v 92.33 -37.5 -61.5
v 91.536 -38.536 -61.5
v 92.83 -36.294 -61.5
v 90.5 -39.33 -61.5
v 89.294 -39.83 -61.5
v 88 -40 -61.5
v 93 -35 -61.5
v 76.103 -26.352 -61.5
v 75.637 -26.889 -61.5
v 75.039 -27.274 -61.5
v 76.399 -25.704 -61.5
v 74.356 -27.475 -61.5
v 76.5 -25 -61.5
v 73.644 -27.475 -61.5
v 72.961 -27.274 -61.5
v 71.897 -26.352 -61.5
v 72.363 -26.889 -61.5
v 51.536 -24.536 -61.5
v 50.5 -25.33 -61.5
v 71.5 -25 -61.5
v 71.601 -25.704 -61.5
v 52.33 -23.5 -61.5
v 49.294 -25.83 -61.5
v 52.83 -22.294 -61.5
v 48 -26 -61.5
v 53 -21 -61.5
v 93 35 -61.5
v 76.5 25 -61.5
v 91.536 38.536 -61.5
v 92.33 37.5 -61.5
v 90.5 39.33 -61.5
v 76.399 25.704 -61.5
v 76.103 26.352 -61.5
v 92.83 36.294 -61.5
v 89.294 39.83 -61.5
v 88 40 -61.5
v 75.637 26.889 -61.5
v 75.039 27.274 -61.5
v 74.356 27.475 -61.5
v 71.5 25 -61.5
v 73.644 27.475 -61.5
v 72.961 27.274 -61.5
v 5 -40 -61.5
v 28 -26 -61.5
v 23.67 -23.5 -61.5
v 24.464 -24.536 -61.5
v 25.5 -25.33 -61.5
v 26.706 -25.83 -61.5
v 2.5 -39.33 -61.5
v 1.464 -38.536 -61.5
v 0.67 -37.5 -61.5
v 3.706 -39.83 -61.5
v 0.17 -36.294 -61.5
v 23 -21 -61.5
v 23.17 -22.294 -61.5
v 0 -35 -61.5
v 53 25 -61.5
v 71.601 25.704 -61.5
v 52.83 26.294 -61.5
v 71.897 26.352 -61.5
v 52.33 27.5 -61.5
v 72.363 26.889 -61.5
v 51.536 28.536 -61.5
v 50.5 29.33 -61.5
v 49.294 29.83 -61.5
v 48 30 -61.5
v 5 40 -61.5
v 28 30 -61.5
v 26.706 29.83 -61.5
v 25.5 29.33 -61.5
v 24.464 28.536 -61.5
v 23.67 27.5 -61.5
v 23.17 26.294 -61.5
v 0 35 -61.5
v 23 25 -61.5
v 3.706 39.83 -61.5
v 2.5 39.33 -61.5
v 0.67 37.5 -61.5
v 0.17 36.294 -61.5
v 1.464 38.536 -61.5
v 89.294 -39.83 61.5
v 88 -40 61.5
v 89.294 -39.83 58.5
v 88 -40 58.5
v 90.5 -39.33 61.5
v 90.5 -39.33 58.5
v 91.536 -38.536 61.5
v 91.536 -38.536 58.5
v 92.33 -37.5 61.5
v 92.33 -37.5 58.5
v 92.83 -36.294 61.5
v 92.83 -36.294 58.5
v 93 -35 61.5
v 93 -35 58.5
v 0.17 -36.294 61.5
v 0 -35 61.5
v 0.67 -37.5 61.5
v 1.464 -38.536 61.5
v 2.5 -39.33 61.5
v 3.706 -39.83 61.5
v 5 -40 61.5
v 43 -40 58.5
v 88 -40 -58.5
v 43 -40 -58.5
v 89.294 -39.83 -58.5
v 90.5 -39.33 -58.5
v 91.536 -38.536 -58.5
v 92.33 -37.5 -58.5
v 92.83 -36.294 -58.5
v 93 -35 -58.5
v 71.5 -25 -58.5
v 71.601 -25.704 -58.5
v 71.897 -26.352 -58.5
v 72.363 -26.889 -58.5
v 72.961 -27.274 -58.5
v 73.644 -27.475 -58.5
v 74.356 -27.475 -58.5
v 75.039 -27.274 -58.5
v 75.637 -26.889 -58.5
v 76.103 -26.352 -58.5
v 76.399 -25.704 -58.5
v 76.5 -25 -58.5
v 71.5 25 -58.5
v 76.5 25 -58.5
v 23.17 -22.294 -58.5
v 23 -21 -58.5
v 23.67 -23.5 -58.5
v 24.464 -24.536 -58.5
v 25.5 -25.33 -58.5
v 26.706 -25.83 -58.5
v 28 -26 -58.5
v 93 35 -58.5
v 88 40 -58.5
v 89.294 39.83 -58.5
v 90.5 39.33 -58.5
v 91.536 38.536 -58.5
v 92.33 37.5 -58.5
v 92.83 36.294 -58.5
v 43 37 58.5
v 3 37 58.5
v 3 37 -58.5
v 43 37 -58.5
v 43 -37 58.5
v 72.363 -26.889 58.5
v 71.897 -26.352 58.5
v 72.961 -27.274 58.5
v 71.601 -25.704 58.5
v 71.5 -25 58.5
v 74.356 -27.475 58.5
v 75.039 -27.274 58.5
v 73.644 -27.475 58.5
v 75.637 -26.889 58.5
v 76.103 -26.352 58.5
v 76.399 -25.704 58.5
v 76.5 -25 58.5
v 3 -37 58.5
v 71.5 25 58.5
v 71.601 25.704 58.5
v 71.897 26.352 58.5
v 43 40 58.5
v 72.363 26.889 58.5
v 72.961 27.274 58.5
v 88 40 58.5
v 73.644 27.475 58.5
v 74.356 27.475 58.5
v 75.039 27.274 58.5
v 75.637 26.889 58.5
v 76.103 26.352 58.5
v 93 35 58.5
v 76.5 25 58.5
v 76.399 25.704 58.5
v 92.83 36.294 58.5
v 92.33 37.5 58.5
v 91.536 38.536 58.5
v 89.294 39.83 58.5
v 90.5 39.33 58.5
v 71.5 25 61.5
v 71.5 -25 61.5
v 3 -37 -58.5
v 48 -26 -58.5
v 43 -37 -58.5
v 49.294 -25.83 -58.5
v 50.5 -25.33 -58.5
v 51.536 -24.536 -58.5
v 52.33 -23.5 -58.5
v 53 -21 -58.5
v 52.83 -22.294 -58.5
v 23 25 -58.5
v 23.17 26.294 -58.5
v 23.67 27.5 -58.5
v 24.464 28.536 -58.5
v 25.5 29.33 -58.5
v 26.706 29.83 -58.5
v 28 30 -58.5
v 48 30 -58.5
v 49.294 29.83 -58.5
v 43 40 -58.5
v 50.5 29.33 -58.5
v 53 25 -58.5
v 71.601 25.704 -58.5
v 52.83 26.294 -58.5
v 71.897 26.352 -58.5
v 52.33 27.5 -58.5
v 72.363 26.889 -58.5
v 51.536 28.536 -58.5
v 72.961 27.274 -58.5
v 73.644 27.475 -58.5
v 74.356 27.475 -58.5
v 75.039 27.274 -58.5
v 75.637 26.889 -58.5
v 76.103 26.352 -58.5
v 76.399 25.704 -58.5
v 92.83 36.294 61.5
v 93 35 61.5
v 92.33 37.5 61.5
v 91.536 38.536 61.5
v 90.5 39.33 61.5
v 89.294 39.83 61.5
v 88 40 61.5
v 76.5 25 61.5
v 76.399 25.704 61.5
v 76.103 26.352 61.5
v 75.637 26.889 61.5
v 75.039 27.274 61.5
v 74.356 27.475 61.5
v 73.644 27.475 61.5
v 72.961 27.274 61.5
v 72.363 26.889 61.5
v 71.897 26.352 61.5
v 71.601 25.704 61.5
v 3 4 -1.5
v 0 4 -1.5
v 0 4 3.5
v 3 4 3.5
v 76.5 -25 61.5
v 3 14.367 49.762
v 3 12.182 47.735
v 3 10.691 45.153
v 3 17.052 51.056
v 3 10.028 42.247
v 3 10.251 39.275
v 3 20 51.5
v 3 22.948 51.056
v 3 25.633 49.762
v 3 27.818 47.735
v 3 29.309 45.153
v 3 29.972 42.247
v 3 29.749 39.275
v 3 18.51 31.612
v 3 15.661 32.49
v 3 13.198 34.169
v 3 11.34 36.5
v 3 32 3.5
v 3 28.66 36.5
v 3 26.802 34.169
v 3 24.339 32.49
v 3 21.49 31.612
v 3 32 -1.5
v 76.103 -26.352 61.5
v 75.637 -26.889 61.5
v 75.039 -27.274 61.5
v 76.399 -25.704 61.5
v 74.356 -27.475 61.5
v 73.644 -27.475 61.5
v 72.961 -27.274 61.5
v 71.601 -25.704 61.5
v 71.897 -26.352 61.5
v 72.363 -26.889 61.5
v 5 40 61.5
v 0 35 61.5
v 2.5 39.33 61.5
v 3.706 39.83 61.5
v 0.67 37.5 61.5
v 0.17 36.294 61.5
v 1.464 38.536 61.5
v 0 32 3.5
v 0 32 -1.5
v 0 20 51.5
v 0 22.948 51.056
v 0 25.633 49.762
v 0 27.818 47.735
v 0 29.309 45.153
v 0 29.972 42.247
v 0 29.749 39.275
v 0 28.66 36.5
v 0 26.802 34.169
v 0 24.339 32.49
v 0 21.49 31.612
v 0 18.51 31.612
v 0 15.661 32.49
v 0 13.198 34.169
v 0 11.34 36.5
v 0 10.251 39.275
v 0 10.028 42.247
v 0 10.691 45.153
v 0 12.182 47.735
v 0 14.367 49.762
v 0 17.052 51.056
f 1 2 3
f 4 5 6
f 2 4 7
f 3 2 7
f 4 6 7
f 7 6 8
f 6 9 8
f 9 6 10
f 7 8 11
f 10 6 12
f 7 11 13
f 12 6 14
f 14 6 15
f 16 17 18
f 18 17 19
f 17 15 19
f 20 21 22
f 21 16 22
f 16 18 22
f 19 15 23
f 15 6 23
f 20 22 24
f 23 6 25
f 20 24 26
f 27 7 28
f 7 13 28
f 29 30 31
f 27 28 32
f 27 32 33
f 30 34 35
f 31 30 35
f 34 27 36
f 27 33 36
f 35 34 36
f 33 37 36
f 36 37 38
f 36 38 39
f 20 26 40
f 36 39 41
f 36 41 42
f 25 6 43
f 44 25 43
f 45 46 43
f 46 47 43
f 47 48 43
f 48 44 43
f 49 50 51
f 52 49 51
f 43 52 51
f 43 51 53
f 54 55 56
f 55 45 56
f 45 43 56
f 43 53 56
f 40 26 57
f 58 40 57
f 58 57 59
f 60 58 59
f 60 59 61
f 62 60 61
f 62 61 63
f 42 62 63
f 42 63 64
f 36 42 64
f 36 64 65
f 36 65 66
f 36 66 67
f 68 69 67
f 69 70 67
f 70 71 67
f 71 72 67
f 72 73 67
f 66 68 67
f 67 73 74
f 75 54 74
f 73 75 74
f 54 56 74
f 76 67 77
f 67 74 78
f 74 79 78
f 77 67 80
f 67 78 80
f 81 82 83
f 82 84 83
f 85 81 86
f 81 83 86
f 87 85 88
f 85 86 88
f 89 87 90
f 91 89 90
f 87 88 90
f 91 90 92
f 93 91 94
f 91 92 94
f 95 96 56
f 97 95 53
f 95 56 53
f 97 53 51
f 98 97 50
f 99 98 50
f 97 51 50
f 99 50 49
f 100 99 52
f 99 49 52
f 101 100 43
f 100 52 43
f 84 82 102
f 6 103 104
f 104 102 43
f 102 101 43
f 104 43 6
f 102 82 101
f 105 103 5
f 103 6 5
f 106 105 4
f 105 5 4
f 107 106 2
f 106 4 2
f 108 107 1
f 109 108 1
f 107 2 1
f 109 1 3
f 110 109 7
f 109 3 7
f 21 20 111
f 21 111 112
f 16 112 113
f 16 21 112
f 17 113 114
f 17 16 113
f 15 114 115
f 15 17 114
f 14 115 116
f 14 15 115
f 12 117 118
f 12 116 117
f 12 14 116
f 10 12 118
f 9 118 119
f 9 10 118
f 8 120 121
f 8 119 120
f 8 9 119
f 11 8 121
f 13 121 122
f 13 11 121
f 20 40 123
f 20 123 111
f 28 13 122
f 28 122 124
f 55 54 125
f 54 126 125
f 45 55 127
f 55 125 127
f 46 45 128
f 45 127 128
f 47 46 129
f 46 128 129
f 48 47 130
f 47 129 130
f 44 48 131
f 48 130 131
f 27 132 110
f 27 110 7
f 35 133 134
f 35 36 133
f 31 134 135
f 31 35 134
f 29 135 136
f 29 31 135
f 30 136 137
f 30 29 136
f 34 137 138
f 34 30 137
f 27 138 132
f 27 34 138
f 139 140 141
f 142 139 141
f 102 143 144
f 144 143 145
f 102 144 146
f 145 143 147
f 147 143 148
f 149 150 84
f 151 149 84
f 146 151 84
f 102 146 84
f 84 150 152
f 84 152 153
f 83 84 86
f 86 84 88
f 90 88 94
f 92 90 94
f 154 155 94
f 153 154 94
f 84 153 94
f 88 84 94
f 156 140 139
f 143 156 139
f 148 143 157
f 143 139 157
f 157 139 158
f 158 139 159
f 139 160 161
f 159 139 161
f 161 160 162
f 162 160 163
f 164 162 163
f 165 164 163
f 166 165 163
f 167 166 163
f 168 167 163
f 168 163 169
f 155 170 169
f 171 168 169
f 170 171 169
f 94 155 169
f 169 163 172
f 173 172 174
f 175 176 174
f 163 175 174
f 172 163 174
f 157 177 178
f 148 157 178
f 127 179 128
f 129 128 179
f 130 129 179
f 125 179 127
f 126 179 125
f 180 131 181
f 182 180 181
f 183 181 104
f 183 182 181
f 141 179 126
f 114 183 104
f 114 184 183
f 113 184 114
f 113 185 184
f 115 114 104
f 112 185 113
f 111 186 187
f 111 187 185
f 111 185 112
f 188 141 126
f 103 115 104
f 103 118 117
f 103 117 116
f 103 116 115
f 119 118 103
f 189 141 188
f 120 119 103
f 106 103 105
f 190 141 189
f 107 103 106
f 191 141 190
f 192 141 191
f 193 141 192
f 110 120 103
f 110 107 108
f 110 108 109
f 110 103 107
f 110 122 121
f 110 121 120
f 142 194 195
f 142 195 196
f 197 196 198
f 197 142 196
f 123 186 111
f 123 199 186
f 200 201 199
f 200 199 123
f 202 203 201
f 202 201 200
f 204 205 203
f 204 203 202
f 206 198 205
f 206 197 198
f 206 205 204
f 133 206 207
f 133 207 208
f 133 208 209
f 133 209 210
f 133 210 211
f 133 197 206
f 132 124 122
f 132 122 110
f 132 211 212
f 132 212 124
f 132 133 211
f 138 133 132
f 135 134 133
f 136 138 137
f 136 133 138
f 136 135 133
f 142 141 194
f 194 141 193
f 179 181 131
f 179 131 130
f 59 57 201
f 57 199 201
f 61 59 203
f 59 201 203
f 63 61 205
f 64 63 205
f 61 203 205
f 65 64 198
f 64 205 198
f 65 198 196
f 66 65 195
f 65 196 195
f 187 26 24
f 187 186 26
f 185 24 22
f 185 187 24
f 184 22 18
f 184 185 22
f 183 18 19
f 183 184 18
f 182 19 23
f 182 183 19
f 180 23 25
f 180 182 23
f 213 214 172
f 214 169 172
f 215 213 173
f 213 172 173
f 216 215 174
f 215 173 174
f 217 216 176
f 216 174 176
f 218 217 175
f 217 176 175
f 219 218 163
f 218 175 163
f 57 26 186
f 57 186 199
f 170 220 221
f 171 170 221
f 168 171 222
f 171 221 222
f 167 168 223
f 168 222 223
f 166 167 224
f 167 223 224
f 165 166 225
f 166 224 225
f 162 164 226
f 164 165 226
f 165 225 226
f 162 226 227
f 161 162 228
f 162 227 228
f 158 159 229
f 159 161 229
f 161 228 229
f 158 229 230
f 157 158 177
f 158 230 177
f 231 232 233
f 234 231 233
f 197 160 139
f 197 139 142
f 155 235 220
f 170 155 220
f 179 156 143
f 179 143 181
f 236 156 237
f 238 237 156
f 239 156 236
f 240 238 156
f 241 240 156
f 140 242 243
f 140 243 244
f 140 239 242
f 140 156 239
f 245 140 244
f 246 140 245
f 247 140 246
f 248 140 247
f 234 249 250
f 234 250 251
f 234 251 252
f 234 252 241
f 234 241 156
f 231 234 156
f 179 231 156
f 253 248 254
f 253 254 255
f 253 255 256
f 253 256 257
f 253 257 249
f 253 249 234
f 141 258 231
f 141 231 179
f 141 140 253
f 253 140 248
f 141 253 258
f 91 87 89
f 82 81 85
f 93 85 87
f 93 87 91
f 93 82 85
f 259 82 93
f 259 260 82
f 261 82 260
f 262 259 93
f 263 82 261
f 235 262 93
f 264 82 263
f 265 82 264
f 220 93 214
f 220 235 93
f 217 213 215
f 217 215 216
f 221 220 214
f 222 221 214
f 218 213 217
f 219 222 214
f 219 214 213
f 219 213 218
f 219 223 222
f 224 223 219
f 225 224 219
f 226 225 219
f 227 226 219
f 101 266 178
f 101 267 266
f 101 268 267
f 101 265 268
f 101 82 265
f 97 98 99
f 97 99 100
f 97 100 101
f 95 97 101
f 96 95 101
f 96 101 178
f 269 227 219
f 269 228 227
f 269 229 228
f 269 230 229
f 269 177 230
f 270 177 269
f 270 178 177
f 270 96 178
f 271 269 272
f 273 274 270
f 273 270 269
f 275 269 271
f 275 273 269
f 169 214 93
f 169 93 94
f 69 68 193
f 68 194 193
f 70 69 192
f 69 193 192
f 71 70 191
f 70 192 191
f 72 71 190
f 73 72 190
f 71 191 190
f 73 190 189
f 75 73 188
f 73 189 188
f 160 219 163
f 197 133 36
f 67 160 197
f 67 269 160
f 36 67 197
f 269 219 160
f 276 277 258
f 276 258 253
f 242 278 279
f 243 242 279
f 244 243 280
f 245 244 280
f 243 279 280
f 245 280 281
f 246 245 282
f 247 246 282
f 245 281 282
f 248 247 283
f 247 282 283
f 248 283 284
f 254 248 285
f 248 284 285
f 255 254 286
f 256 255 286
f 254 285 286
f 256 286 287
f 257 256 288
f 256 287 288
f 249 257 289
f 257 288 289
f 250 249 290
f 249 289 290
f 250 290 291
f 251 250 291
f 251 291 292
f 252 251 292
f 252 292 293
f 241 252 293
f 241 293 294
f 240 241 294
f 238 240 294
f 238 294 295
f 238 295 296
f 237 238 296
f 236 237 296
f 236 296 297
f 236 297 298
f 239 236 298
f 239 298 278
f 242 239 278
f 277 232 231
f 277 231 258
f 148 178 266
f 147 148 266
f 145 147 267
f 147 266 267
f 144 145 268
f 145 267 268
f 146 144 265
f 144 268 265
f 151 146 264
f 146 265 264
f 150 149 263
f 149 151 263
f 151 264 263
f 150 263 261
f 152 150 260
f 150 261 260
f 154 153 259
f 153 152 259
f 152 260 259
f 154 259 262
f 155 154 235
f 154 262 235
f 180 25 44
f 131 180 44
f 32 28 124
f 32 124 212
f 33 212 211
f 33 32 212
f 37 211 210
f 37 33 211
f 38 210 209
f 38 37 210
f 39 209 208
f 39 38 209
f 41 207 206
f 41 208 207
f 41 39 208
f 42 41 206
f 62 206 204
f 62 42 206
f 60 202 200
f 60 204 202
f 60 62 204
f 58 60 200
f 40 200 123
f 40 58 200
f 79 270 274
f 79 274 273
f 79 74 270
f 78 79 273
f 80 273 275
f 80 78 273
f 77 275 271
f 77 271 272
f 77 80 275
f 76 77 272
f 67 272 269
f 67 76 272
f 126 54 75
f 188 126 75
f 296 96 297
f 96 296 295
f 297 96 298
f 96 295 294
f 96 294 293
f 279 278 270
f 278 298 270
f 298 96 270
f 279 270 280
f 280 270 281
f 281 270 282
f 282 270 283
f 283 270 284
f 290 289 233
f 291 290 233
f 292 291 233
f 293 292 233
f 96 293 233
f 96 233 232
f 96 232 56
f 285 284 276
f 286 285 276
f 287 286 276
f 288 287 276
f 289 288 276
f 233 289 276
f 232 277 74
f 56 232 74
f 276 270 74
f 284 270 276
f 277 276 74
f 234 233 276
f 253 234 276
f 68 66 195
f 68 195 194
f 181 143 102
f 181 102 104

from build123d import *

# Parameters (mm, degrees)
SKETCH_1_W          = 123
SKETCH_1_H          = 80
EXTRUDE_1_DEPTH     = 93
SHELL_1_T           = -3
SKETCH_2_W          = 50
SKETCH_2_H          = 117
CUT_EXTRUDE_1_DEPTH = 138.227001716
FILLET_1_R          = 5
FILLET_2_R          = 5
CUT_EXTRUDE_2_REACH = 161.305
CUT_EXTRUDE_4_REACH = 161.305
SKETCH_5_W          = 30
SKETCH_5_H          = 56
CUT_EXTRUDE_5_REACH = 120.454
SKETCH_6_R          = 10
FILLET_3_R          = 5
CUT_EXTRUDE_6_REACH = 120.454
SKETCH_7_W          = 5
SKETCH_7_H          = 28


with BuildPart() as part:
    # 草圖1 → 填料-伸長1 (new body)
    with BuildSketch(Plane(origin=(0, 0, 0), x_dir=(0, 0, -1), z_dir=(1, 0, 0))):
        Rectangle(SKETCH_1_W, SKETCH_1_H)
    extrude(amount=EXTRUDE_1_DEPTH)

    # 薄殼1
    shell_1_openings = [part.faces().sort_by_distance(p)[0] for p in [
        (93, 0, 0),
    ]]
    offset(amount=SHELL_1_T, openings=shell_1_openings, kind=Kind.INTERSECTION)

    # 草圖2 → 除料-伸長1 (cut, through all)
    with BuildSketch(Plane(origin=(0, 40, 0), x_dir=(1, 0, 0), z_dir=(0, 1, 0))):
        with Locations((68, 0)):
            Rectangle(SKETCH_2_W, SKETCH_2_H)
    extrude(amount=-CUT_EXTRUDE_1_DEPTH, mode=Mode.SUBTRACT)

    # 圓角1
    fillet_1_edges = [part.edges().sort_by_distance(p)[0] for p in [
        (0, -40, 0),
        (0, 40, 0),
    ]]
    fillet(fillet_1_edges, radius=FILLET_1_R)

    # 圓角2
    fillet_2_edges = [part.edges().sort_by_distance(p)[0] for p in [
        (93, -40, 60),
        (93, -40, -60),
        (93, 40, 60),
        (93, 40, -60),
    ]]
    fillet(fillet_2_edges, radius=FILLET_2_R)

    # 草圖3 → 除料-伸長2 (cut, up to next)
    with BuildSketch(Plane(origin=(0, 0, -61.5), x_dir=(-1, 0, 0), z_dir=(0, 0, -1)), mode=Mode.PRIVATE) as cut_extrude_2_sk1:
        with BuildLine():
            Line((-76.5, -25), (-76.5, 25))
            ThreePointArc((-76.5, 25), (-74, 27.5), (-71.5, 25))
            Line((-71.5, 25), (-71.5, -25))
            ThreePointArc((-71.5, -25), (-74, -27.5), (-76.5, -25))
        make_face()
    cut_extrude_2_tool1 = extrude(cut_extrude_2_sk1.sketch, amount=-CUT_EXTRUDE_2_REACH, mode=Mode.PRIVATE) & part.part
    cut_extrude_2 = cut_extrude_2_tool1.solids().sort_by_distance((74, 0, -61.5))[0]
    add(cut_extrude_2, mode=Mode.SUBTRACT)

    # 鏡射1: 除料-伸長2 across plane
    add(cut_extrude_2.mirror(Plane.XY), mode=Mode.SUBTRACT)

    # 草圖5 → 除料-伸長4 (cut, up to next)
    with BuildSketch(Plane(origin=(0, 0, -61.5), x_dir=(-1, 0, 0), z_dir=(0, 0, -1)), mode=Mode.PRIVATE) as cut_extrude_4_sk1:
        with Locations((-38, 2)):
            Rectangle(SKETCH_5_W, SKETCH_5_H)
    cut_extrude_4_tool1 = extrude(cut_extrude_4_sk1.sketch, amount=-CUT_EXTRUDE_4_REACH, mode=Mode.PRIVATE) & part.part
    add(cut_extrude_4_tool1.solids().sort_by_distance((38, 2, -61.5))[0], mode=Mode.SUBTRACT)

    # 草圖6 → 除料-伸長5 (cut, up to next)
    with BuildSketch(Plane.ZY, mode=Mode.PRIVATE) as cut_extrude_5_sk1:
        with Locations((41.5, 20)):
            Circle(SKETCH_6_R)
    cut_extrude_5_tool1 = extrude(cut_extrude_5_sk1.sketch, amount=-CUT_EXTRUDE_5_REACH, mode=Mode.PRIVATE) & part.part
    add(cut_extrude_5_tool1.solids().sort_by_distance((0, 20, 41.5))[0], mode=Mode.SUBTRACT)

    # 圓角3
    fillet_3_edges = [part.edges().sort_by_distance(p)[0] for p in [
        (23, -26, -60),
        (23, 30, -60),
        (53, 30, -60),
        (53, -26, -60),
    ]]
    fillet(fillet_3_edges, radius=FILLET_3_R)

    # 草圖7 → 除料-伸長6 (cut, up to next)
    with BuildSketch(Plane.ZY, mode=Mode.PRIVATE) as cut_extrude_6_sk1:
        with Locations((1, 18)):
            Rectangle(SKETCH_7_W, SKETCH_7_H)
    cut_extrude_6_tool1 = extrude(cut_extrude_6_sk1.sketch, amount=-CUT_EXTRUDE_6_REACH, mode=Mode.PRIVATE) & part.part
    add(cut_extrude_6_tool1.solids().sort_by_distance((0, 18, 1))[0], mode=Mode.SUBTRACT)


solid = part.part
